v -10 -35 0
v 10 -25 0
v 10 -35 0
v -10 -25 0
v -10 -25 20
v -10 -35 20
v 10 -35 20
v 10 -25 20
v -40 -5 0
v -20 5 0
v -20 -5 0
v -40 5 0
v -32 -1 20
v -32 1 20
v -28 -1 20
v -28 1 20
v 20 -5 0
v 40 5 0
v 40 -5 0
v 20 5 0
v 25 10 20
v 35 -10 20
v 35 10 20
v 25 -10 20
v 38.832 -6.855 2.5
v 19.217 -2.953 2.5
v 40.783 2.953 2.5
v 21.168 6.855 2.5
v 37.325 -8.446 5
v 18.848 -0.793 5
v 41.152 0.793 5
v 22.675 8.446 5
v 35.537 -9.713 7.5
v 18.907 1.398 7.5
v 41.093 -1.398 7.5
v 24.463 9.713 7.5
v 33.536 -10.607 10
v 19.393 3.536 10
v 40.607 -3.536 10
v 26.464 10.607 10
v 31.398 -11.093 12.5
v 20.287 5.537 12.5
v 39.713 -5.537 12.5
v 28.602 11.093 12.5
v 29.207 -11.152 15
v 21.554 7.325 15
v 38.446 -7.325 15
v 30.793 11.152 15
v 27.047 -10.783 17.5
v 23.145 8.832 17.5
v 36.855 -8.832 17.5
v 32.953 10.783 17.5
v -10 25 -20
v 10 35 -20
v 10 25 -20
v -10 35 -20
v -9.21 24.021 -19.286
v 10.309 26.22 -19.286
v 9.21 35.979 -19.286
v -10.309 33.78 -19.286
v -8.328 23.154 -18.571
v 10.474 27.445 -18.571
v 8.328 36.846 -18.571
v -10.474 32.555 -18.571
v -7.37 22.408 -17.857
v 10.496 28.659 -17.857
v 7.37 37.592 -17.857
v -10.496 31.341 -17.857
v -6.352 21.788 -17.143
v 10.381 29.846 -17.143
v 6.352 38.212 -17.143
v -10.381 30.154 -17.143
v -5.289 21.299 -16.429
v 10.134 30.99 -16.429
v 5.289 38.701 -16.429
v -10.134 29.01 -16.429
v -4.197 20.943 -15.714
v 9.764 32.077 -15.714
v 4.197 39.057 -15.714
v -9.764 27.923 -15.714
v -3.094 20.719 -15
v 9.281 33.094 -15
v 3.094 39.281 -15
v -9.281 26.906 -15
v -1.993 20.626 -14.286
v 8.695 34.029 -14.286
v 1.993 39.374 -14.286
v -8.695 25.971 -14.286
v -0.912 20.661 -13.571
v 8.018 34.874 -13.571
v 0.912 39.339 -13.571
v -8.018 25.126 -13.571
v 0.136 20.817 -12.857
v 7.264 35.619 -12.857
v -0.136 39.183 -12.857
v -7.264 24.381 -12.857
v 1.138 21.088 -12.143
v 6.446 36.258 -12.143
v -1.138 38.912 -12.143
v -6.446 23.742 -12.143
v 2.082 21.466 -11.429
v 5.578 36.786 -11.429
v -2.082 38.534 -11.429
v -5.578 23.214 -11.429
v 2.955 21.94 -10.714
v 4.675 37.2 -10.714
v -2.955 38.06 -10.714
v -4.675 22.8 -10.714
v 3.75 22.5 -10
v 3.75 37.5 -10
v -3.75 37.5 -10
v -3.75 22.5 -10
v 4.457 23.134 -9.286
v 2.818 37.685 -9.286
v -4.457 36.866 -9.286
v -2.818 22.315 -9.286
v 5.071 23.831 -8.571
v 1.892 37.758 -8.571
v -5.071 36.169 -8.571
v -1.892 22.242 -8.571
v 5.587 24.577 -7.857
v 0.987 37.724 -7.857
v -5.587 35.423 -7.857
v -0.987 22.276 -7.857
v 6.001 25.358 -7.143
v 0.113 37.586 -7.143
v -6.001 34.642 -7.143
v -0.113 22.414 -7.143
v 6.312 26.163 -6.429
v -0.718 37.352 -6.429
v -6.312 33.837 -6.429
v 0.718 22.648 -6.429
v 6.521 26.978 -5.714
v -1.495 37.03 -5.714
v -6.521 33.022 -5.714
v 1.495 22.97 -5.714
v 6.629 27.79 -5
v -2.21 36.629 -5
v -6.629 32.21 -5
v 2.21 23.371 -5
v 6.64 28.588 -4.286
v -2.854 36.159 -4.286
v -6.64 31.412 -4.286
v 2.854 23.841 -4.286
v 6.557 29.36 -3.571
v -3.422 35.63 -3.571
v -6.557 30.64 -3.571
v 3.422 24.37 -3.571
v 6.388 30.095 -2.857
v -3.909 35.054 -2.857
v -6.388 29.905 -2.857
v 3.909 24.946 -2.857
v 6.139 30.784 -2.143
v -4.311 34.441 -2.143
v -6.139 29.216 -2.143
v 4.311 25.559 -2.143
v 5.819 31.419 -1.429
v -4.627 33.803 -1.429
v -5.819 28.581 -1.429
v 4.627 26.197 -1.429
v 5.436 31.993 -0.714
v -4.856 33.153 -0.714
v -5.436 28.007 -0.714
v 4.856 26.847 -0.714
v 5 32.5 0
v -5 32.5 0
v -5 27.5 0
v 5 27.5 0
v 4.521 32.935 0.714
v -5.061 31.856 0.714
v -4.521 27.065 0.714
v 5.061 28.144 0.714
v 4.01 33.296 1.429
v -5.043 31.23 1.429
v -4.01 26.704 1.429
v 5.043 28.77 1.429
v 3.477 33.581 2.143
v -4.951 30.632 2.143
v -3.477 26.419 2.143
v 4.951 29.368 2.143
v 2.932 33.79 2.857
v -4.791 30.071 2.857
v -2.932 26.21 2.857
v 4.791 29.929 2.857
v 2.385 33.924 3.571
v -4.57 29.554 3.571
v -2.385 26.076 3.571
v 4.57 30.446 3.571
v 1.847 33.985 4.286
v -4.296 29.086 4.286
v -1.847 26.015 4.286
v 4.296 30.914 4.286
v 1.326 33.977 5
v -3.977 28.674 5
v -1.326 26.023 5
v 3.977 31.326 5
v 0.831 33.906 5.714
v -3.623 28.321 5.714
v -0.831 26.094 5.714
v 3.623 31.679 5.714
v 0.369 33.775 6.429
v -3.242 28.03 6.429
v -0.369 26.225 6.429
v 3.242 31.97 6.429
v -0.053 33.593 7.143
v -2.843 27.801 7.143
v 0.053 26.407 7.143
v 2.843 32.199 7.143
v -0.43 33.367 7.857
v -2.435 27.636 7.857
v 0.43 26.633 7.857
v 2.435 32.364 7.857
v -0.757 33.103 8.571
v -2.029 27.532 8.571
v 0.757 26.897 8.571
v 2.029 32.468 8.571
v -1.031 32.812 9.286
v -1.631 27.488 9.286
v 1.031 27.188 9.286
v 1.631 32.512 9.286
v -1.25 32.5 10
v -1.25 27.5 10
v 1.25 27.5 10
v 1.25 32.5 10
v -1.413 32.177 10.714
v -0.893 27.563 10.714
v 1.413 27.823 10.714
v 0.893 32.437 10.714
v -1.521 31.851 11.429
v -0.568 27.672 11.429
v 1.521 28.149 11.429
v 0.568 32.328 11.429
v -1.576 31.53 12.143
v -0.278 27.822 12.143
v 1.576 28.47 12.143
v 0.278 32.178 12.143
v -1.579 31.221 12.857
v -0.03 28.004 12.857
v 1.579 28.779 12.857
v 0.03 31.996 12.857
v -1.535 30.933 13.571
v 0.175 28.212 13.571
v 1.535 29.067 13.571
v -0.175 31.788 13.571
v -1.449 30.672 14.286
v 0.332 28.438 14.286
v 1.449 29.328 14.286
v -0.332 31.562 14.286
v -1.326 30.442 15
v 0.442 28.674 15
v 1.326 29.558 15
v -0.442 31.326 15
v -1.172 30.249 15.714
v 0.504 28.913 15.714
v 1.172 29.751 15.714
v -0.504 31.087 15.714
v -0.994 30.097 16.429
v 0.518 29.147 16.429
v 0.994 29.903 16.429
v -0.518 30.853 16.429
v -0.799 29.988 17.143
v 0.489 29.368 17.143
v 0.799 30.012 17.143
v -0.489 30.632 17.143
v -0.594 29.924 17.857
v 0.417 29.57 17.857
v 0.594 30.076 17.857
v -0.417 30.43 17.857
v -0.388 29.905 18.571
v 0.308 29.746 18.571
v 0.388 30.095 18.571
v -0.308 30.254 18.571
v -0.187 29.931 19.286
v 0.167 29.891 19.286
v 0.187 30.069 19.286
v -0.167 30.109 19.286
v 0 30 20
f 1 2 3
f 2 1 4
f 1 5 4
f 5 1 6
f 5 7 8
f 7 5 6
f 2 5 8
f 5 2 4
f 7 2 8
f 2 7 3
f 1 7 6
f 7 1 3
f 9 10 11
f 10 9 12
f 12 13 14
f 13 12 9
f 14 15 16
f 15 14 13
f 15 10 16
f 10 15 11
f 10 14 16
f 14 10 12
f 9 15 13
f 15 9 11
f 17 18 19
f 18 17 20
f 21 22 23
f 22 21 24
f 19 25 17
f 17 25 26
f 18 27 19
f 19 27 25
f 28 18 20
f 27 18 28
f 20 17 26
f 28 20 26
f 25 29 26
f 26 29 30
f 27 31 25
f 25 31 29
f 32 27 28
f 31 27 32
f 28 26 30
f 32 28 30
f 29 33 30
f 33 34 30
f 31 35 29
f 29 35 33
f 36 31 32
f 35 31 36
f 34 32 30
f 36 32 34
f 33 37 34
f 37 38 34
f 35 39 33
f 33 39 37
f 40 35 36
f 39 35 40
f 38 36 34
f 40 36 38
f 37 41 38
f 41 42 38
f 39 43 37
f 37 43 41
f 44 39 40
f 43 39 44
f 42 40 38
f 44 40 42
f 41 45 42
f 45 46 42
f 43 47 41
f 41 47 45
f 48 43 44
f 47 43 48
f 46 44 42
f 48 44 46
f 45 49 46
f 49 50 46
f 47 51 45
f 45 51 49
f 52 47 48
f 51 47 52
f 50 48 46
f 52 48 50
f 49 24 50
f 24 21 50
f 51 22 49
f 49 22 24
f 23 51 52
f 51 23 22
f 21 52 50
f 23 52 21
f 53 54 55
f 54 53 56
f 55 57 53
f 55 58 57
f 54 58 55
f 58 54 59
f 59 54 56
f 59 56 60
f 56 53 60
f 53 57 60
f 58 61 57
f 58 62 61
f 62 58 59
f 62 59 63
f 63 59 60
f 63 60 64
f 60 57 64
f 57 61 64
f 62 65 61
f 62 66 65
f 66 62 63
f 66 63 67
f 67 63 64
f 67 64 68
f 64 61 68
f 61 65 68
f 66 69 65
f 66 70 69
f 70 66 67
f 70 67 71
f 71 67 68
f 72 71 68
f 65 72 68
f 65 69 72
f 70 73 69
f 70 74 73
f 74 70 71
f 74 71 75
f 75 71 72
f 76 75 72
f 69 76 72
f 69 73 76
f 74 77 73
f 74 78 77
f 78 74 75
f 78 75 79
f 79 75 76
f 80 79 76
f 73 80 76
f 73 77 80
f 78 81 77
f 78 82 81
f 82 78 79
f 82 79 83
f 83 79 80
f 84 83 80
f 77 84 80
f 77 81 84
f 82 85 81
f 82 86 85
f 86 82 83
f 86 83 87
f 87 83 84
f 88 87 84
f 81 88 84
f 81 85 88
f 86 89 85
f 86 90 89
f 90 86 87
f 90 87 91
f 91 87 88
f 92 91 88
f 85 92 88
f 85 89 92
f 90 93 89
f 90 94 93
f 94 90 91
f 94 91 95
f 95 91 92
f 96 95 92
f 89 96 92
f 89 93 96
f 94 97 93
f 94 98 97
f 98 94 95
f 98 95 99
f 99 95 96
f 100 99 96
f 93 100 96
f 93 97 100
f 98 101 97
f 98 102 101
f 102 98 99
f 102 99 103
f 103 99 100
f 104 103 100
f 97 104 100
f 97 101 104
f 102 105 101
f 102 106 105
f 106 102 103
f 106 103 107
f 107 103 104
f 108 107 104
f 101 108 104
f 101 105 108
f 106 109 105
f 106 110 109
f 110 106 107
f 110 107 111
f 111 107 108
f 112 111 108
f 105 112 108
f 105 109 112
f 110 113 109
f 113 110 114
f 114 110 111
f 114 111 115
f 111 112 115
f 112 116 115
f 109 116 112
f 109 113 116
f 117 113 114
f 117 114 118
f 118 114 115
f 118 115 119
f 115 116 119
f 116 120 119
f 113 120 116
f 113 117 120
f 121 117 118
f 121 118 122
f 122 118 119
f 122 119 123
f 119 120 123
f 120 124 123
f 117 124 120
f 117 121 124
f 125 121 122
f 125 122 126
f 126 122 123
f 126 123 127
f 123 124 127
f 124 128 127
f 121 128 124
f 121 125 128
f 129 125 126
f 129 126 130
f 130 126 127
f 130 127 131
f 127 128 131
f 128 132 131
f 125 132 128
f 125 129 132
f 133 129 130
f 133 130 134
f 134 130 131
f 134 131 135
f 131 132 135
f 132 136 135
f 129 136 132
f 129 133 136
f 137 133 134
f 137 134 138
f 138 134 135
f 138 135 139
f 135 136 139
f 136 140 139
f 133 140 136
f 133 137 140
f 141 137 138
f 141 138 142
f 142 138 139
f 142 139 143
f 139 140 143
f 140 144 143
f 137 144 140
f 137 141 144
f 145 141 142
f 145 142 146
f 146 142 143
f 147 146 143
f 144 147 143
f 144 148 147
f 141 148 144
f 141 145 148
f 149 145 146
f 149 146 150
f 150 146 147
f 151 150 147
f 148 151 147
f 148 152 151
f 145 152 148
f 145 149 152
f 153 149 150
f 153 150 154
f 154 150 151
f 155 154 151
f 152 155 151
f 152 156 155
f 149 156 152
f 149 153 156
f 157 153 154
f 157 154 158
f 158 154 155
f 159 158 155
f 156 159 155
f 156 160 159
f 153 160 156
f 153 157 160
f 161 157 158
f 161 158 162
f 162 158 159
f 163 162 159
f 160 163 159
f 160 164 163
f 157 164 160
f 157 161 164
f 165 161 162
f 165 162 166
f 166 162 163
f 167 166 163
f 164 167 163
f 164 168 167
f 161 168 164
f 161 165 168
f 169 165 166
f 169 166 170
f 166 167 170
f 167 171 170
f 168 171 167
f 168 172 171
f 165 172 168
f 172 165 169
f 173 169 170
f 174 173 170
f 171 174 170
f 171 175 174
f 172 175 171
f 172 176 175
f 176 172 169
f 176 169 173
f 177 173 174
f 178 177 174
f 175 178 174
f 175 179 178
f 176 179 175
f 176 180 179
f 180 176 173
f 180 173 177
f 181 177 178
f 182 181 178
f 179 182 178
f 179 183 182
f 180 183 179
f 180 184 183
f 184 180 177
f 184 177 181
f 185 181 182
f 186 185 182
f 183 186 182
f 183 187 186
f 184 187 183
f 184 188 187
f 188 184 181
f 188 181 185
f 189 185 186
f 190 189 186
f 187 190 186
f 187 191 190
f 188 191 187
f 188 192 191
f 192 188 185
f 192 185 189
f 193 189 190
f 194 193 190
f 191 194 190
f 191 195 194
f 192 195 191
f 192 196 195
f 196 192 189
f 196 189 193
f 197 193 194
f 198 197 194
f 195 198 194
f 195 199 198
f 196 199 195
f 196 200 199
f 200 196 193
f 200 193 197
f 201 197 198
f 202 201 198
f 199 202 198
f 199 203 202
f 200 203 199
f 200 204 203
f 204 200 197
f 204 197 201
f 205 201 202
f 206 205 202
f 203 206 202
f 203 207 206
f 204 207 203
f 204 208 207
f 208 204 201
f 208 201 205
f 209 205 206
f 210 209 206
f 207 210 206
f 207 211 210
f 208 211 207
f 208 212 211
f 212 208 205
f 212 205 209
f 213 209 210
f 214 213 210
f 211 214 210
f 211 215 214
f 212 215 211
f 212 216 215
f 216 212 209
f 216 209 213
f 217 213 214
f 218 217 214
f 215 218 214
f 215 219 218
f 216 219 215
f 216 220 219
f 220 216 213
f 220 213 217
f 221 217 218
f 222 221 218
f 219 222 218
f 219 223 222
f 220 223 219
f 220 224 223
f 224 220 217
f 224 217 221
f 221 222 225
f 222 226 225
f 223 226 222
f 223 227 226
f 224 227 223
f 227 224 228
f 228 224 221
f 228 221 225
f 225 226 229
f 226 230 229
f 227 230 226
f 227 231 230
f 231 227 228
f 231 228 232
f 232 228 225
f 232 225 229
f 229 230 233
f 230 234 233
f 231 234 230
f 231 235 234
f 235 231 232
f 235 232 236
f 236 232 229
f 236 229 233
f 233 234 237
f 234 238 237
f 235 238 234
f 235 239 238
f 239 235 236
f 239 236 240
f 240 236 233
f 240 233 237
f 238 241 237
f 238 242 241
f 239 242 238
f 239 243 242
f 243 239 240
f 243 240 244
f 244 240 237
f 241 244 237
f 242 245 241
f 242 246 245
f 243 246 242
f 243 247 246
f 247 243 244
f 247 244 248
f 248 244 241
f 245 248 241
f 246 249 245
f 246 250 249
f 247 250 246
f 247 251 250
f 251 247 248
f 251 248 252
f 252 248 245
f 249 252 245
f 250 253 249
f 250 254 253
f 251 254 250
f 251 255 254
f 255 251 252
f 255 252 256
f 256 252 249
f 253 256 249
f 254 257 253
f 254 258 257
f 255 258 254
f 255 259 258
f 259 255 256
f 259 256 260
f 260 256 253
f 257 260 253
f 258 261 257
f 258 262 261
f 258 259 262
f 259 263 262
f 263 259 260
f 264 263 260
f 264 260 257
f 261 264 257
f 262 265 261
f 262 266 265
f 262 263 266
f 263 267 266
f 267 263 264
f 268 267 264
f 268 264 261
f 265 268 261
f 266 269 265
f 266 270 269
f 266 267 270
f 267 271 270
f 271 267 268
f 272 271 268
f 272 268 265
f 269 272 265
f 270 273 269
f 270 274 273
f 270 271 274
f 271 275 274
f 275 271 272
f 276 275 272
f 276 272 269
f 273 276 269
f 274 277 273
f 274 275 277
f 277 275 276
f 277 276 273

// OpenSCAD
// Volume: 12335.232753372355, SurfaceArea: 5812.640949693574
echo(version=version());

// simple 2D -> 3D extrusion of a rectangle
color("red")
    translate([0, -30, 0])
        linear_extrude(height = 20)
            square([20, 10], center = true);

// using the scale parameter a frustum can be constructed
color("green")
    translate([-30, 0, 0])
        linear_extrude(height = 20, scale = 0.2)
            square([20, 10], center = true);

// with twist the extruded shape will rotate around the Z axis
color("cyan")
    translate([30, 0, 0])
        linear_extrude(height = 20, twist = 90)
            square([20, 10], center = true);

// combining both relatively complex shapes can be created
color("gray")
    translate([0, 30, 0])
        linear_extrude(height = 40, twist = -360, scale = 0, center = true, $fs=1, $fa=1)
            square([20, 10], center = true);

// Written in 2015 by Torsten Paul <Torsten.Paul@gmx.de>
//
// To the extent possible under law, the author(s) have dedicated all
// copyright and related and neighboring rights to this software to the
// public domain worldwide. This software is distributed without any
// warranty.
//
// You should have received a copy of the CC0 Public Domain
// Dedication along with this software.
// If not, see <http://creativecommons.org/publicdomain/zero/1.0/>.
